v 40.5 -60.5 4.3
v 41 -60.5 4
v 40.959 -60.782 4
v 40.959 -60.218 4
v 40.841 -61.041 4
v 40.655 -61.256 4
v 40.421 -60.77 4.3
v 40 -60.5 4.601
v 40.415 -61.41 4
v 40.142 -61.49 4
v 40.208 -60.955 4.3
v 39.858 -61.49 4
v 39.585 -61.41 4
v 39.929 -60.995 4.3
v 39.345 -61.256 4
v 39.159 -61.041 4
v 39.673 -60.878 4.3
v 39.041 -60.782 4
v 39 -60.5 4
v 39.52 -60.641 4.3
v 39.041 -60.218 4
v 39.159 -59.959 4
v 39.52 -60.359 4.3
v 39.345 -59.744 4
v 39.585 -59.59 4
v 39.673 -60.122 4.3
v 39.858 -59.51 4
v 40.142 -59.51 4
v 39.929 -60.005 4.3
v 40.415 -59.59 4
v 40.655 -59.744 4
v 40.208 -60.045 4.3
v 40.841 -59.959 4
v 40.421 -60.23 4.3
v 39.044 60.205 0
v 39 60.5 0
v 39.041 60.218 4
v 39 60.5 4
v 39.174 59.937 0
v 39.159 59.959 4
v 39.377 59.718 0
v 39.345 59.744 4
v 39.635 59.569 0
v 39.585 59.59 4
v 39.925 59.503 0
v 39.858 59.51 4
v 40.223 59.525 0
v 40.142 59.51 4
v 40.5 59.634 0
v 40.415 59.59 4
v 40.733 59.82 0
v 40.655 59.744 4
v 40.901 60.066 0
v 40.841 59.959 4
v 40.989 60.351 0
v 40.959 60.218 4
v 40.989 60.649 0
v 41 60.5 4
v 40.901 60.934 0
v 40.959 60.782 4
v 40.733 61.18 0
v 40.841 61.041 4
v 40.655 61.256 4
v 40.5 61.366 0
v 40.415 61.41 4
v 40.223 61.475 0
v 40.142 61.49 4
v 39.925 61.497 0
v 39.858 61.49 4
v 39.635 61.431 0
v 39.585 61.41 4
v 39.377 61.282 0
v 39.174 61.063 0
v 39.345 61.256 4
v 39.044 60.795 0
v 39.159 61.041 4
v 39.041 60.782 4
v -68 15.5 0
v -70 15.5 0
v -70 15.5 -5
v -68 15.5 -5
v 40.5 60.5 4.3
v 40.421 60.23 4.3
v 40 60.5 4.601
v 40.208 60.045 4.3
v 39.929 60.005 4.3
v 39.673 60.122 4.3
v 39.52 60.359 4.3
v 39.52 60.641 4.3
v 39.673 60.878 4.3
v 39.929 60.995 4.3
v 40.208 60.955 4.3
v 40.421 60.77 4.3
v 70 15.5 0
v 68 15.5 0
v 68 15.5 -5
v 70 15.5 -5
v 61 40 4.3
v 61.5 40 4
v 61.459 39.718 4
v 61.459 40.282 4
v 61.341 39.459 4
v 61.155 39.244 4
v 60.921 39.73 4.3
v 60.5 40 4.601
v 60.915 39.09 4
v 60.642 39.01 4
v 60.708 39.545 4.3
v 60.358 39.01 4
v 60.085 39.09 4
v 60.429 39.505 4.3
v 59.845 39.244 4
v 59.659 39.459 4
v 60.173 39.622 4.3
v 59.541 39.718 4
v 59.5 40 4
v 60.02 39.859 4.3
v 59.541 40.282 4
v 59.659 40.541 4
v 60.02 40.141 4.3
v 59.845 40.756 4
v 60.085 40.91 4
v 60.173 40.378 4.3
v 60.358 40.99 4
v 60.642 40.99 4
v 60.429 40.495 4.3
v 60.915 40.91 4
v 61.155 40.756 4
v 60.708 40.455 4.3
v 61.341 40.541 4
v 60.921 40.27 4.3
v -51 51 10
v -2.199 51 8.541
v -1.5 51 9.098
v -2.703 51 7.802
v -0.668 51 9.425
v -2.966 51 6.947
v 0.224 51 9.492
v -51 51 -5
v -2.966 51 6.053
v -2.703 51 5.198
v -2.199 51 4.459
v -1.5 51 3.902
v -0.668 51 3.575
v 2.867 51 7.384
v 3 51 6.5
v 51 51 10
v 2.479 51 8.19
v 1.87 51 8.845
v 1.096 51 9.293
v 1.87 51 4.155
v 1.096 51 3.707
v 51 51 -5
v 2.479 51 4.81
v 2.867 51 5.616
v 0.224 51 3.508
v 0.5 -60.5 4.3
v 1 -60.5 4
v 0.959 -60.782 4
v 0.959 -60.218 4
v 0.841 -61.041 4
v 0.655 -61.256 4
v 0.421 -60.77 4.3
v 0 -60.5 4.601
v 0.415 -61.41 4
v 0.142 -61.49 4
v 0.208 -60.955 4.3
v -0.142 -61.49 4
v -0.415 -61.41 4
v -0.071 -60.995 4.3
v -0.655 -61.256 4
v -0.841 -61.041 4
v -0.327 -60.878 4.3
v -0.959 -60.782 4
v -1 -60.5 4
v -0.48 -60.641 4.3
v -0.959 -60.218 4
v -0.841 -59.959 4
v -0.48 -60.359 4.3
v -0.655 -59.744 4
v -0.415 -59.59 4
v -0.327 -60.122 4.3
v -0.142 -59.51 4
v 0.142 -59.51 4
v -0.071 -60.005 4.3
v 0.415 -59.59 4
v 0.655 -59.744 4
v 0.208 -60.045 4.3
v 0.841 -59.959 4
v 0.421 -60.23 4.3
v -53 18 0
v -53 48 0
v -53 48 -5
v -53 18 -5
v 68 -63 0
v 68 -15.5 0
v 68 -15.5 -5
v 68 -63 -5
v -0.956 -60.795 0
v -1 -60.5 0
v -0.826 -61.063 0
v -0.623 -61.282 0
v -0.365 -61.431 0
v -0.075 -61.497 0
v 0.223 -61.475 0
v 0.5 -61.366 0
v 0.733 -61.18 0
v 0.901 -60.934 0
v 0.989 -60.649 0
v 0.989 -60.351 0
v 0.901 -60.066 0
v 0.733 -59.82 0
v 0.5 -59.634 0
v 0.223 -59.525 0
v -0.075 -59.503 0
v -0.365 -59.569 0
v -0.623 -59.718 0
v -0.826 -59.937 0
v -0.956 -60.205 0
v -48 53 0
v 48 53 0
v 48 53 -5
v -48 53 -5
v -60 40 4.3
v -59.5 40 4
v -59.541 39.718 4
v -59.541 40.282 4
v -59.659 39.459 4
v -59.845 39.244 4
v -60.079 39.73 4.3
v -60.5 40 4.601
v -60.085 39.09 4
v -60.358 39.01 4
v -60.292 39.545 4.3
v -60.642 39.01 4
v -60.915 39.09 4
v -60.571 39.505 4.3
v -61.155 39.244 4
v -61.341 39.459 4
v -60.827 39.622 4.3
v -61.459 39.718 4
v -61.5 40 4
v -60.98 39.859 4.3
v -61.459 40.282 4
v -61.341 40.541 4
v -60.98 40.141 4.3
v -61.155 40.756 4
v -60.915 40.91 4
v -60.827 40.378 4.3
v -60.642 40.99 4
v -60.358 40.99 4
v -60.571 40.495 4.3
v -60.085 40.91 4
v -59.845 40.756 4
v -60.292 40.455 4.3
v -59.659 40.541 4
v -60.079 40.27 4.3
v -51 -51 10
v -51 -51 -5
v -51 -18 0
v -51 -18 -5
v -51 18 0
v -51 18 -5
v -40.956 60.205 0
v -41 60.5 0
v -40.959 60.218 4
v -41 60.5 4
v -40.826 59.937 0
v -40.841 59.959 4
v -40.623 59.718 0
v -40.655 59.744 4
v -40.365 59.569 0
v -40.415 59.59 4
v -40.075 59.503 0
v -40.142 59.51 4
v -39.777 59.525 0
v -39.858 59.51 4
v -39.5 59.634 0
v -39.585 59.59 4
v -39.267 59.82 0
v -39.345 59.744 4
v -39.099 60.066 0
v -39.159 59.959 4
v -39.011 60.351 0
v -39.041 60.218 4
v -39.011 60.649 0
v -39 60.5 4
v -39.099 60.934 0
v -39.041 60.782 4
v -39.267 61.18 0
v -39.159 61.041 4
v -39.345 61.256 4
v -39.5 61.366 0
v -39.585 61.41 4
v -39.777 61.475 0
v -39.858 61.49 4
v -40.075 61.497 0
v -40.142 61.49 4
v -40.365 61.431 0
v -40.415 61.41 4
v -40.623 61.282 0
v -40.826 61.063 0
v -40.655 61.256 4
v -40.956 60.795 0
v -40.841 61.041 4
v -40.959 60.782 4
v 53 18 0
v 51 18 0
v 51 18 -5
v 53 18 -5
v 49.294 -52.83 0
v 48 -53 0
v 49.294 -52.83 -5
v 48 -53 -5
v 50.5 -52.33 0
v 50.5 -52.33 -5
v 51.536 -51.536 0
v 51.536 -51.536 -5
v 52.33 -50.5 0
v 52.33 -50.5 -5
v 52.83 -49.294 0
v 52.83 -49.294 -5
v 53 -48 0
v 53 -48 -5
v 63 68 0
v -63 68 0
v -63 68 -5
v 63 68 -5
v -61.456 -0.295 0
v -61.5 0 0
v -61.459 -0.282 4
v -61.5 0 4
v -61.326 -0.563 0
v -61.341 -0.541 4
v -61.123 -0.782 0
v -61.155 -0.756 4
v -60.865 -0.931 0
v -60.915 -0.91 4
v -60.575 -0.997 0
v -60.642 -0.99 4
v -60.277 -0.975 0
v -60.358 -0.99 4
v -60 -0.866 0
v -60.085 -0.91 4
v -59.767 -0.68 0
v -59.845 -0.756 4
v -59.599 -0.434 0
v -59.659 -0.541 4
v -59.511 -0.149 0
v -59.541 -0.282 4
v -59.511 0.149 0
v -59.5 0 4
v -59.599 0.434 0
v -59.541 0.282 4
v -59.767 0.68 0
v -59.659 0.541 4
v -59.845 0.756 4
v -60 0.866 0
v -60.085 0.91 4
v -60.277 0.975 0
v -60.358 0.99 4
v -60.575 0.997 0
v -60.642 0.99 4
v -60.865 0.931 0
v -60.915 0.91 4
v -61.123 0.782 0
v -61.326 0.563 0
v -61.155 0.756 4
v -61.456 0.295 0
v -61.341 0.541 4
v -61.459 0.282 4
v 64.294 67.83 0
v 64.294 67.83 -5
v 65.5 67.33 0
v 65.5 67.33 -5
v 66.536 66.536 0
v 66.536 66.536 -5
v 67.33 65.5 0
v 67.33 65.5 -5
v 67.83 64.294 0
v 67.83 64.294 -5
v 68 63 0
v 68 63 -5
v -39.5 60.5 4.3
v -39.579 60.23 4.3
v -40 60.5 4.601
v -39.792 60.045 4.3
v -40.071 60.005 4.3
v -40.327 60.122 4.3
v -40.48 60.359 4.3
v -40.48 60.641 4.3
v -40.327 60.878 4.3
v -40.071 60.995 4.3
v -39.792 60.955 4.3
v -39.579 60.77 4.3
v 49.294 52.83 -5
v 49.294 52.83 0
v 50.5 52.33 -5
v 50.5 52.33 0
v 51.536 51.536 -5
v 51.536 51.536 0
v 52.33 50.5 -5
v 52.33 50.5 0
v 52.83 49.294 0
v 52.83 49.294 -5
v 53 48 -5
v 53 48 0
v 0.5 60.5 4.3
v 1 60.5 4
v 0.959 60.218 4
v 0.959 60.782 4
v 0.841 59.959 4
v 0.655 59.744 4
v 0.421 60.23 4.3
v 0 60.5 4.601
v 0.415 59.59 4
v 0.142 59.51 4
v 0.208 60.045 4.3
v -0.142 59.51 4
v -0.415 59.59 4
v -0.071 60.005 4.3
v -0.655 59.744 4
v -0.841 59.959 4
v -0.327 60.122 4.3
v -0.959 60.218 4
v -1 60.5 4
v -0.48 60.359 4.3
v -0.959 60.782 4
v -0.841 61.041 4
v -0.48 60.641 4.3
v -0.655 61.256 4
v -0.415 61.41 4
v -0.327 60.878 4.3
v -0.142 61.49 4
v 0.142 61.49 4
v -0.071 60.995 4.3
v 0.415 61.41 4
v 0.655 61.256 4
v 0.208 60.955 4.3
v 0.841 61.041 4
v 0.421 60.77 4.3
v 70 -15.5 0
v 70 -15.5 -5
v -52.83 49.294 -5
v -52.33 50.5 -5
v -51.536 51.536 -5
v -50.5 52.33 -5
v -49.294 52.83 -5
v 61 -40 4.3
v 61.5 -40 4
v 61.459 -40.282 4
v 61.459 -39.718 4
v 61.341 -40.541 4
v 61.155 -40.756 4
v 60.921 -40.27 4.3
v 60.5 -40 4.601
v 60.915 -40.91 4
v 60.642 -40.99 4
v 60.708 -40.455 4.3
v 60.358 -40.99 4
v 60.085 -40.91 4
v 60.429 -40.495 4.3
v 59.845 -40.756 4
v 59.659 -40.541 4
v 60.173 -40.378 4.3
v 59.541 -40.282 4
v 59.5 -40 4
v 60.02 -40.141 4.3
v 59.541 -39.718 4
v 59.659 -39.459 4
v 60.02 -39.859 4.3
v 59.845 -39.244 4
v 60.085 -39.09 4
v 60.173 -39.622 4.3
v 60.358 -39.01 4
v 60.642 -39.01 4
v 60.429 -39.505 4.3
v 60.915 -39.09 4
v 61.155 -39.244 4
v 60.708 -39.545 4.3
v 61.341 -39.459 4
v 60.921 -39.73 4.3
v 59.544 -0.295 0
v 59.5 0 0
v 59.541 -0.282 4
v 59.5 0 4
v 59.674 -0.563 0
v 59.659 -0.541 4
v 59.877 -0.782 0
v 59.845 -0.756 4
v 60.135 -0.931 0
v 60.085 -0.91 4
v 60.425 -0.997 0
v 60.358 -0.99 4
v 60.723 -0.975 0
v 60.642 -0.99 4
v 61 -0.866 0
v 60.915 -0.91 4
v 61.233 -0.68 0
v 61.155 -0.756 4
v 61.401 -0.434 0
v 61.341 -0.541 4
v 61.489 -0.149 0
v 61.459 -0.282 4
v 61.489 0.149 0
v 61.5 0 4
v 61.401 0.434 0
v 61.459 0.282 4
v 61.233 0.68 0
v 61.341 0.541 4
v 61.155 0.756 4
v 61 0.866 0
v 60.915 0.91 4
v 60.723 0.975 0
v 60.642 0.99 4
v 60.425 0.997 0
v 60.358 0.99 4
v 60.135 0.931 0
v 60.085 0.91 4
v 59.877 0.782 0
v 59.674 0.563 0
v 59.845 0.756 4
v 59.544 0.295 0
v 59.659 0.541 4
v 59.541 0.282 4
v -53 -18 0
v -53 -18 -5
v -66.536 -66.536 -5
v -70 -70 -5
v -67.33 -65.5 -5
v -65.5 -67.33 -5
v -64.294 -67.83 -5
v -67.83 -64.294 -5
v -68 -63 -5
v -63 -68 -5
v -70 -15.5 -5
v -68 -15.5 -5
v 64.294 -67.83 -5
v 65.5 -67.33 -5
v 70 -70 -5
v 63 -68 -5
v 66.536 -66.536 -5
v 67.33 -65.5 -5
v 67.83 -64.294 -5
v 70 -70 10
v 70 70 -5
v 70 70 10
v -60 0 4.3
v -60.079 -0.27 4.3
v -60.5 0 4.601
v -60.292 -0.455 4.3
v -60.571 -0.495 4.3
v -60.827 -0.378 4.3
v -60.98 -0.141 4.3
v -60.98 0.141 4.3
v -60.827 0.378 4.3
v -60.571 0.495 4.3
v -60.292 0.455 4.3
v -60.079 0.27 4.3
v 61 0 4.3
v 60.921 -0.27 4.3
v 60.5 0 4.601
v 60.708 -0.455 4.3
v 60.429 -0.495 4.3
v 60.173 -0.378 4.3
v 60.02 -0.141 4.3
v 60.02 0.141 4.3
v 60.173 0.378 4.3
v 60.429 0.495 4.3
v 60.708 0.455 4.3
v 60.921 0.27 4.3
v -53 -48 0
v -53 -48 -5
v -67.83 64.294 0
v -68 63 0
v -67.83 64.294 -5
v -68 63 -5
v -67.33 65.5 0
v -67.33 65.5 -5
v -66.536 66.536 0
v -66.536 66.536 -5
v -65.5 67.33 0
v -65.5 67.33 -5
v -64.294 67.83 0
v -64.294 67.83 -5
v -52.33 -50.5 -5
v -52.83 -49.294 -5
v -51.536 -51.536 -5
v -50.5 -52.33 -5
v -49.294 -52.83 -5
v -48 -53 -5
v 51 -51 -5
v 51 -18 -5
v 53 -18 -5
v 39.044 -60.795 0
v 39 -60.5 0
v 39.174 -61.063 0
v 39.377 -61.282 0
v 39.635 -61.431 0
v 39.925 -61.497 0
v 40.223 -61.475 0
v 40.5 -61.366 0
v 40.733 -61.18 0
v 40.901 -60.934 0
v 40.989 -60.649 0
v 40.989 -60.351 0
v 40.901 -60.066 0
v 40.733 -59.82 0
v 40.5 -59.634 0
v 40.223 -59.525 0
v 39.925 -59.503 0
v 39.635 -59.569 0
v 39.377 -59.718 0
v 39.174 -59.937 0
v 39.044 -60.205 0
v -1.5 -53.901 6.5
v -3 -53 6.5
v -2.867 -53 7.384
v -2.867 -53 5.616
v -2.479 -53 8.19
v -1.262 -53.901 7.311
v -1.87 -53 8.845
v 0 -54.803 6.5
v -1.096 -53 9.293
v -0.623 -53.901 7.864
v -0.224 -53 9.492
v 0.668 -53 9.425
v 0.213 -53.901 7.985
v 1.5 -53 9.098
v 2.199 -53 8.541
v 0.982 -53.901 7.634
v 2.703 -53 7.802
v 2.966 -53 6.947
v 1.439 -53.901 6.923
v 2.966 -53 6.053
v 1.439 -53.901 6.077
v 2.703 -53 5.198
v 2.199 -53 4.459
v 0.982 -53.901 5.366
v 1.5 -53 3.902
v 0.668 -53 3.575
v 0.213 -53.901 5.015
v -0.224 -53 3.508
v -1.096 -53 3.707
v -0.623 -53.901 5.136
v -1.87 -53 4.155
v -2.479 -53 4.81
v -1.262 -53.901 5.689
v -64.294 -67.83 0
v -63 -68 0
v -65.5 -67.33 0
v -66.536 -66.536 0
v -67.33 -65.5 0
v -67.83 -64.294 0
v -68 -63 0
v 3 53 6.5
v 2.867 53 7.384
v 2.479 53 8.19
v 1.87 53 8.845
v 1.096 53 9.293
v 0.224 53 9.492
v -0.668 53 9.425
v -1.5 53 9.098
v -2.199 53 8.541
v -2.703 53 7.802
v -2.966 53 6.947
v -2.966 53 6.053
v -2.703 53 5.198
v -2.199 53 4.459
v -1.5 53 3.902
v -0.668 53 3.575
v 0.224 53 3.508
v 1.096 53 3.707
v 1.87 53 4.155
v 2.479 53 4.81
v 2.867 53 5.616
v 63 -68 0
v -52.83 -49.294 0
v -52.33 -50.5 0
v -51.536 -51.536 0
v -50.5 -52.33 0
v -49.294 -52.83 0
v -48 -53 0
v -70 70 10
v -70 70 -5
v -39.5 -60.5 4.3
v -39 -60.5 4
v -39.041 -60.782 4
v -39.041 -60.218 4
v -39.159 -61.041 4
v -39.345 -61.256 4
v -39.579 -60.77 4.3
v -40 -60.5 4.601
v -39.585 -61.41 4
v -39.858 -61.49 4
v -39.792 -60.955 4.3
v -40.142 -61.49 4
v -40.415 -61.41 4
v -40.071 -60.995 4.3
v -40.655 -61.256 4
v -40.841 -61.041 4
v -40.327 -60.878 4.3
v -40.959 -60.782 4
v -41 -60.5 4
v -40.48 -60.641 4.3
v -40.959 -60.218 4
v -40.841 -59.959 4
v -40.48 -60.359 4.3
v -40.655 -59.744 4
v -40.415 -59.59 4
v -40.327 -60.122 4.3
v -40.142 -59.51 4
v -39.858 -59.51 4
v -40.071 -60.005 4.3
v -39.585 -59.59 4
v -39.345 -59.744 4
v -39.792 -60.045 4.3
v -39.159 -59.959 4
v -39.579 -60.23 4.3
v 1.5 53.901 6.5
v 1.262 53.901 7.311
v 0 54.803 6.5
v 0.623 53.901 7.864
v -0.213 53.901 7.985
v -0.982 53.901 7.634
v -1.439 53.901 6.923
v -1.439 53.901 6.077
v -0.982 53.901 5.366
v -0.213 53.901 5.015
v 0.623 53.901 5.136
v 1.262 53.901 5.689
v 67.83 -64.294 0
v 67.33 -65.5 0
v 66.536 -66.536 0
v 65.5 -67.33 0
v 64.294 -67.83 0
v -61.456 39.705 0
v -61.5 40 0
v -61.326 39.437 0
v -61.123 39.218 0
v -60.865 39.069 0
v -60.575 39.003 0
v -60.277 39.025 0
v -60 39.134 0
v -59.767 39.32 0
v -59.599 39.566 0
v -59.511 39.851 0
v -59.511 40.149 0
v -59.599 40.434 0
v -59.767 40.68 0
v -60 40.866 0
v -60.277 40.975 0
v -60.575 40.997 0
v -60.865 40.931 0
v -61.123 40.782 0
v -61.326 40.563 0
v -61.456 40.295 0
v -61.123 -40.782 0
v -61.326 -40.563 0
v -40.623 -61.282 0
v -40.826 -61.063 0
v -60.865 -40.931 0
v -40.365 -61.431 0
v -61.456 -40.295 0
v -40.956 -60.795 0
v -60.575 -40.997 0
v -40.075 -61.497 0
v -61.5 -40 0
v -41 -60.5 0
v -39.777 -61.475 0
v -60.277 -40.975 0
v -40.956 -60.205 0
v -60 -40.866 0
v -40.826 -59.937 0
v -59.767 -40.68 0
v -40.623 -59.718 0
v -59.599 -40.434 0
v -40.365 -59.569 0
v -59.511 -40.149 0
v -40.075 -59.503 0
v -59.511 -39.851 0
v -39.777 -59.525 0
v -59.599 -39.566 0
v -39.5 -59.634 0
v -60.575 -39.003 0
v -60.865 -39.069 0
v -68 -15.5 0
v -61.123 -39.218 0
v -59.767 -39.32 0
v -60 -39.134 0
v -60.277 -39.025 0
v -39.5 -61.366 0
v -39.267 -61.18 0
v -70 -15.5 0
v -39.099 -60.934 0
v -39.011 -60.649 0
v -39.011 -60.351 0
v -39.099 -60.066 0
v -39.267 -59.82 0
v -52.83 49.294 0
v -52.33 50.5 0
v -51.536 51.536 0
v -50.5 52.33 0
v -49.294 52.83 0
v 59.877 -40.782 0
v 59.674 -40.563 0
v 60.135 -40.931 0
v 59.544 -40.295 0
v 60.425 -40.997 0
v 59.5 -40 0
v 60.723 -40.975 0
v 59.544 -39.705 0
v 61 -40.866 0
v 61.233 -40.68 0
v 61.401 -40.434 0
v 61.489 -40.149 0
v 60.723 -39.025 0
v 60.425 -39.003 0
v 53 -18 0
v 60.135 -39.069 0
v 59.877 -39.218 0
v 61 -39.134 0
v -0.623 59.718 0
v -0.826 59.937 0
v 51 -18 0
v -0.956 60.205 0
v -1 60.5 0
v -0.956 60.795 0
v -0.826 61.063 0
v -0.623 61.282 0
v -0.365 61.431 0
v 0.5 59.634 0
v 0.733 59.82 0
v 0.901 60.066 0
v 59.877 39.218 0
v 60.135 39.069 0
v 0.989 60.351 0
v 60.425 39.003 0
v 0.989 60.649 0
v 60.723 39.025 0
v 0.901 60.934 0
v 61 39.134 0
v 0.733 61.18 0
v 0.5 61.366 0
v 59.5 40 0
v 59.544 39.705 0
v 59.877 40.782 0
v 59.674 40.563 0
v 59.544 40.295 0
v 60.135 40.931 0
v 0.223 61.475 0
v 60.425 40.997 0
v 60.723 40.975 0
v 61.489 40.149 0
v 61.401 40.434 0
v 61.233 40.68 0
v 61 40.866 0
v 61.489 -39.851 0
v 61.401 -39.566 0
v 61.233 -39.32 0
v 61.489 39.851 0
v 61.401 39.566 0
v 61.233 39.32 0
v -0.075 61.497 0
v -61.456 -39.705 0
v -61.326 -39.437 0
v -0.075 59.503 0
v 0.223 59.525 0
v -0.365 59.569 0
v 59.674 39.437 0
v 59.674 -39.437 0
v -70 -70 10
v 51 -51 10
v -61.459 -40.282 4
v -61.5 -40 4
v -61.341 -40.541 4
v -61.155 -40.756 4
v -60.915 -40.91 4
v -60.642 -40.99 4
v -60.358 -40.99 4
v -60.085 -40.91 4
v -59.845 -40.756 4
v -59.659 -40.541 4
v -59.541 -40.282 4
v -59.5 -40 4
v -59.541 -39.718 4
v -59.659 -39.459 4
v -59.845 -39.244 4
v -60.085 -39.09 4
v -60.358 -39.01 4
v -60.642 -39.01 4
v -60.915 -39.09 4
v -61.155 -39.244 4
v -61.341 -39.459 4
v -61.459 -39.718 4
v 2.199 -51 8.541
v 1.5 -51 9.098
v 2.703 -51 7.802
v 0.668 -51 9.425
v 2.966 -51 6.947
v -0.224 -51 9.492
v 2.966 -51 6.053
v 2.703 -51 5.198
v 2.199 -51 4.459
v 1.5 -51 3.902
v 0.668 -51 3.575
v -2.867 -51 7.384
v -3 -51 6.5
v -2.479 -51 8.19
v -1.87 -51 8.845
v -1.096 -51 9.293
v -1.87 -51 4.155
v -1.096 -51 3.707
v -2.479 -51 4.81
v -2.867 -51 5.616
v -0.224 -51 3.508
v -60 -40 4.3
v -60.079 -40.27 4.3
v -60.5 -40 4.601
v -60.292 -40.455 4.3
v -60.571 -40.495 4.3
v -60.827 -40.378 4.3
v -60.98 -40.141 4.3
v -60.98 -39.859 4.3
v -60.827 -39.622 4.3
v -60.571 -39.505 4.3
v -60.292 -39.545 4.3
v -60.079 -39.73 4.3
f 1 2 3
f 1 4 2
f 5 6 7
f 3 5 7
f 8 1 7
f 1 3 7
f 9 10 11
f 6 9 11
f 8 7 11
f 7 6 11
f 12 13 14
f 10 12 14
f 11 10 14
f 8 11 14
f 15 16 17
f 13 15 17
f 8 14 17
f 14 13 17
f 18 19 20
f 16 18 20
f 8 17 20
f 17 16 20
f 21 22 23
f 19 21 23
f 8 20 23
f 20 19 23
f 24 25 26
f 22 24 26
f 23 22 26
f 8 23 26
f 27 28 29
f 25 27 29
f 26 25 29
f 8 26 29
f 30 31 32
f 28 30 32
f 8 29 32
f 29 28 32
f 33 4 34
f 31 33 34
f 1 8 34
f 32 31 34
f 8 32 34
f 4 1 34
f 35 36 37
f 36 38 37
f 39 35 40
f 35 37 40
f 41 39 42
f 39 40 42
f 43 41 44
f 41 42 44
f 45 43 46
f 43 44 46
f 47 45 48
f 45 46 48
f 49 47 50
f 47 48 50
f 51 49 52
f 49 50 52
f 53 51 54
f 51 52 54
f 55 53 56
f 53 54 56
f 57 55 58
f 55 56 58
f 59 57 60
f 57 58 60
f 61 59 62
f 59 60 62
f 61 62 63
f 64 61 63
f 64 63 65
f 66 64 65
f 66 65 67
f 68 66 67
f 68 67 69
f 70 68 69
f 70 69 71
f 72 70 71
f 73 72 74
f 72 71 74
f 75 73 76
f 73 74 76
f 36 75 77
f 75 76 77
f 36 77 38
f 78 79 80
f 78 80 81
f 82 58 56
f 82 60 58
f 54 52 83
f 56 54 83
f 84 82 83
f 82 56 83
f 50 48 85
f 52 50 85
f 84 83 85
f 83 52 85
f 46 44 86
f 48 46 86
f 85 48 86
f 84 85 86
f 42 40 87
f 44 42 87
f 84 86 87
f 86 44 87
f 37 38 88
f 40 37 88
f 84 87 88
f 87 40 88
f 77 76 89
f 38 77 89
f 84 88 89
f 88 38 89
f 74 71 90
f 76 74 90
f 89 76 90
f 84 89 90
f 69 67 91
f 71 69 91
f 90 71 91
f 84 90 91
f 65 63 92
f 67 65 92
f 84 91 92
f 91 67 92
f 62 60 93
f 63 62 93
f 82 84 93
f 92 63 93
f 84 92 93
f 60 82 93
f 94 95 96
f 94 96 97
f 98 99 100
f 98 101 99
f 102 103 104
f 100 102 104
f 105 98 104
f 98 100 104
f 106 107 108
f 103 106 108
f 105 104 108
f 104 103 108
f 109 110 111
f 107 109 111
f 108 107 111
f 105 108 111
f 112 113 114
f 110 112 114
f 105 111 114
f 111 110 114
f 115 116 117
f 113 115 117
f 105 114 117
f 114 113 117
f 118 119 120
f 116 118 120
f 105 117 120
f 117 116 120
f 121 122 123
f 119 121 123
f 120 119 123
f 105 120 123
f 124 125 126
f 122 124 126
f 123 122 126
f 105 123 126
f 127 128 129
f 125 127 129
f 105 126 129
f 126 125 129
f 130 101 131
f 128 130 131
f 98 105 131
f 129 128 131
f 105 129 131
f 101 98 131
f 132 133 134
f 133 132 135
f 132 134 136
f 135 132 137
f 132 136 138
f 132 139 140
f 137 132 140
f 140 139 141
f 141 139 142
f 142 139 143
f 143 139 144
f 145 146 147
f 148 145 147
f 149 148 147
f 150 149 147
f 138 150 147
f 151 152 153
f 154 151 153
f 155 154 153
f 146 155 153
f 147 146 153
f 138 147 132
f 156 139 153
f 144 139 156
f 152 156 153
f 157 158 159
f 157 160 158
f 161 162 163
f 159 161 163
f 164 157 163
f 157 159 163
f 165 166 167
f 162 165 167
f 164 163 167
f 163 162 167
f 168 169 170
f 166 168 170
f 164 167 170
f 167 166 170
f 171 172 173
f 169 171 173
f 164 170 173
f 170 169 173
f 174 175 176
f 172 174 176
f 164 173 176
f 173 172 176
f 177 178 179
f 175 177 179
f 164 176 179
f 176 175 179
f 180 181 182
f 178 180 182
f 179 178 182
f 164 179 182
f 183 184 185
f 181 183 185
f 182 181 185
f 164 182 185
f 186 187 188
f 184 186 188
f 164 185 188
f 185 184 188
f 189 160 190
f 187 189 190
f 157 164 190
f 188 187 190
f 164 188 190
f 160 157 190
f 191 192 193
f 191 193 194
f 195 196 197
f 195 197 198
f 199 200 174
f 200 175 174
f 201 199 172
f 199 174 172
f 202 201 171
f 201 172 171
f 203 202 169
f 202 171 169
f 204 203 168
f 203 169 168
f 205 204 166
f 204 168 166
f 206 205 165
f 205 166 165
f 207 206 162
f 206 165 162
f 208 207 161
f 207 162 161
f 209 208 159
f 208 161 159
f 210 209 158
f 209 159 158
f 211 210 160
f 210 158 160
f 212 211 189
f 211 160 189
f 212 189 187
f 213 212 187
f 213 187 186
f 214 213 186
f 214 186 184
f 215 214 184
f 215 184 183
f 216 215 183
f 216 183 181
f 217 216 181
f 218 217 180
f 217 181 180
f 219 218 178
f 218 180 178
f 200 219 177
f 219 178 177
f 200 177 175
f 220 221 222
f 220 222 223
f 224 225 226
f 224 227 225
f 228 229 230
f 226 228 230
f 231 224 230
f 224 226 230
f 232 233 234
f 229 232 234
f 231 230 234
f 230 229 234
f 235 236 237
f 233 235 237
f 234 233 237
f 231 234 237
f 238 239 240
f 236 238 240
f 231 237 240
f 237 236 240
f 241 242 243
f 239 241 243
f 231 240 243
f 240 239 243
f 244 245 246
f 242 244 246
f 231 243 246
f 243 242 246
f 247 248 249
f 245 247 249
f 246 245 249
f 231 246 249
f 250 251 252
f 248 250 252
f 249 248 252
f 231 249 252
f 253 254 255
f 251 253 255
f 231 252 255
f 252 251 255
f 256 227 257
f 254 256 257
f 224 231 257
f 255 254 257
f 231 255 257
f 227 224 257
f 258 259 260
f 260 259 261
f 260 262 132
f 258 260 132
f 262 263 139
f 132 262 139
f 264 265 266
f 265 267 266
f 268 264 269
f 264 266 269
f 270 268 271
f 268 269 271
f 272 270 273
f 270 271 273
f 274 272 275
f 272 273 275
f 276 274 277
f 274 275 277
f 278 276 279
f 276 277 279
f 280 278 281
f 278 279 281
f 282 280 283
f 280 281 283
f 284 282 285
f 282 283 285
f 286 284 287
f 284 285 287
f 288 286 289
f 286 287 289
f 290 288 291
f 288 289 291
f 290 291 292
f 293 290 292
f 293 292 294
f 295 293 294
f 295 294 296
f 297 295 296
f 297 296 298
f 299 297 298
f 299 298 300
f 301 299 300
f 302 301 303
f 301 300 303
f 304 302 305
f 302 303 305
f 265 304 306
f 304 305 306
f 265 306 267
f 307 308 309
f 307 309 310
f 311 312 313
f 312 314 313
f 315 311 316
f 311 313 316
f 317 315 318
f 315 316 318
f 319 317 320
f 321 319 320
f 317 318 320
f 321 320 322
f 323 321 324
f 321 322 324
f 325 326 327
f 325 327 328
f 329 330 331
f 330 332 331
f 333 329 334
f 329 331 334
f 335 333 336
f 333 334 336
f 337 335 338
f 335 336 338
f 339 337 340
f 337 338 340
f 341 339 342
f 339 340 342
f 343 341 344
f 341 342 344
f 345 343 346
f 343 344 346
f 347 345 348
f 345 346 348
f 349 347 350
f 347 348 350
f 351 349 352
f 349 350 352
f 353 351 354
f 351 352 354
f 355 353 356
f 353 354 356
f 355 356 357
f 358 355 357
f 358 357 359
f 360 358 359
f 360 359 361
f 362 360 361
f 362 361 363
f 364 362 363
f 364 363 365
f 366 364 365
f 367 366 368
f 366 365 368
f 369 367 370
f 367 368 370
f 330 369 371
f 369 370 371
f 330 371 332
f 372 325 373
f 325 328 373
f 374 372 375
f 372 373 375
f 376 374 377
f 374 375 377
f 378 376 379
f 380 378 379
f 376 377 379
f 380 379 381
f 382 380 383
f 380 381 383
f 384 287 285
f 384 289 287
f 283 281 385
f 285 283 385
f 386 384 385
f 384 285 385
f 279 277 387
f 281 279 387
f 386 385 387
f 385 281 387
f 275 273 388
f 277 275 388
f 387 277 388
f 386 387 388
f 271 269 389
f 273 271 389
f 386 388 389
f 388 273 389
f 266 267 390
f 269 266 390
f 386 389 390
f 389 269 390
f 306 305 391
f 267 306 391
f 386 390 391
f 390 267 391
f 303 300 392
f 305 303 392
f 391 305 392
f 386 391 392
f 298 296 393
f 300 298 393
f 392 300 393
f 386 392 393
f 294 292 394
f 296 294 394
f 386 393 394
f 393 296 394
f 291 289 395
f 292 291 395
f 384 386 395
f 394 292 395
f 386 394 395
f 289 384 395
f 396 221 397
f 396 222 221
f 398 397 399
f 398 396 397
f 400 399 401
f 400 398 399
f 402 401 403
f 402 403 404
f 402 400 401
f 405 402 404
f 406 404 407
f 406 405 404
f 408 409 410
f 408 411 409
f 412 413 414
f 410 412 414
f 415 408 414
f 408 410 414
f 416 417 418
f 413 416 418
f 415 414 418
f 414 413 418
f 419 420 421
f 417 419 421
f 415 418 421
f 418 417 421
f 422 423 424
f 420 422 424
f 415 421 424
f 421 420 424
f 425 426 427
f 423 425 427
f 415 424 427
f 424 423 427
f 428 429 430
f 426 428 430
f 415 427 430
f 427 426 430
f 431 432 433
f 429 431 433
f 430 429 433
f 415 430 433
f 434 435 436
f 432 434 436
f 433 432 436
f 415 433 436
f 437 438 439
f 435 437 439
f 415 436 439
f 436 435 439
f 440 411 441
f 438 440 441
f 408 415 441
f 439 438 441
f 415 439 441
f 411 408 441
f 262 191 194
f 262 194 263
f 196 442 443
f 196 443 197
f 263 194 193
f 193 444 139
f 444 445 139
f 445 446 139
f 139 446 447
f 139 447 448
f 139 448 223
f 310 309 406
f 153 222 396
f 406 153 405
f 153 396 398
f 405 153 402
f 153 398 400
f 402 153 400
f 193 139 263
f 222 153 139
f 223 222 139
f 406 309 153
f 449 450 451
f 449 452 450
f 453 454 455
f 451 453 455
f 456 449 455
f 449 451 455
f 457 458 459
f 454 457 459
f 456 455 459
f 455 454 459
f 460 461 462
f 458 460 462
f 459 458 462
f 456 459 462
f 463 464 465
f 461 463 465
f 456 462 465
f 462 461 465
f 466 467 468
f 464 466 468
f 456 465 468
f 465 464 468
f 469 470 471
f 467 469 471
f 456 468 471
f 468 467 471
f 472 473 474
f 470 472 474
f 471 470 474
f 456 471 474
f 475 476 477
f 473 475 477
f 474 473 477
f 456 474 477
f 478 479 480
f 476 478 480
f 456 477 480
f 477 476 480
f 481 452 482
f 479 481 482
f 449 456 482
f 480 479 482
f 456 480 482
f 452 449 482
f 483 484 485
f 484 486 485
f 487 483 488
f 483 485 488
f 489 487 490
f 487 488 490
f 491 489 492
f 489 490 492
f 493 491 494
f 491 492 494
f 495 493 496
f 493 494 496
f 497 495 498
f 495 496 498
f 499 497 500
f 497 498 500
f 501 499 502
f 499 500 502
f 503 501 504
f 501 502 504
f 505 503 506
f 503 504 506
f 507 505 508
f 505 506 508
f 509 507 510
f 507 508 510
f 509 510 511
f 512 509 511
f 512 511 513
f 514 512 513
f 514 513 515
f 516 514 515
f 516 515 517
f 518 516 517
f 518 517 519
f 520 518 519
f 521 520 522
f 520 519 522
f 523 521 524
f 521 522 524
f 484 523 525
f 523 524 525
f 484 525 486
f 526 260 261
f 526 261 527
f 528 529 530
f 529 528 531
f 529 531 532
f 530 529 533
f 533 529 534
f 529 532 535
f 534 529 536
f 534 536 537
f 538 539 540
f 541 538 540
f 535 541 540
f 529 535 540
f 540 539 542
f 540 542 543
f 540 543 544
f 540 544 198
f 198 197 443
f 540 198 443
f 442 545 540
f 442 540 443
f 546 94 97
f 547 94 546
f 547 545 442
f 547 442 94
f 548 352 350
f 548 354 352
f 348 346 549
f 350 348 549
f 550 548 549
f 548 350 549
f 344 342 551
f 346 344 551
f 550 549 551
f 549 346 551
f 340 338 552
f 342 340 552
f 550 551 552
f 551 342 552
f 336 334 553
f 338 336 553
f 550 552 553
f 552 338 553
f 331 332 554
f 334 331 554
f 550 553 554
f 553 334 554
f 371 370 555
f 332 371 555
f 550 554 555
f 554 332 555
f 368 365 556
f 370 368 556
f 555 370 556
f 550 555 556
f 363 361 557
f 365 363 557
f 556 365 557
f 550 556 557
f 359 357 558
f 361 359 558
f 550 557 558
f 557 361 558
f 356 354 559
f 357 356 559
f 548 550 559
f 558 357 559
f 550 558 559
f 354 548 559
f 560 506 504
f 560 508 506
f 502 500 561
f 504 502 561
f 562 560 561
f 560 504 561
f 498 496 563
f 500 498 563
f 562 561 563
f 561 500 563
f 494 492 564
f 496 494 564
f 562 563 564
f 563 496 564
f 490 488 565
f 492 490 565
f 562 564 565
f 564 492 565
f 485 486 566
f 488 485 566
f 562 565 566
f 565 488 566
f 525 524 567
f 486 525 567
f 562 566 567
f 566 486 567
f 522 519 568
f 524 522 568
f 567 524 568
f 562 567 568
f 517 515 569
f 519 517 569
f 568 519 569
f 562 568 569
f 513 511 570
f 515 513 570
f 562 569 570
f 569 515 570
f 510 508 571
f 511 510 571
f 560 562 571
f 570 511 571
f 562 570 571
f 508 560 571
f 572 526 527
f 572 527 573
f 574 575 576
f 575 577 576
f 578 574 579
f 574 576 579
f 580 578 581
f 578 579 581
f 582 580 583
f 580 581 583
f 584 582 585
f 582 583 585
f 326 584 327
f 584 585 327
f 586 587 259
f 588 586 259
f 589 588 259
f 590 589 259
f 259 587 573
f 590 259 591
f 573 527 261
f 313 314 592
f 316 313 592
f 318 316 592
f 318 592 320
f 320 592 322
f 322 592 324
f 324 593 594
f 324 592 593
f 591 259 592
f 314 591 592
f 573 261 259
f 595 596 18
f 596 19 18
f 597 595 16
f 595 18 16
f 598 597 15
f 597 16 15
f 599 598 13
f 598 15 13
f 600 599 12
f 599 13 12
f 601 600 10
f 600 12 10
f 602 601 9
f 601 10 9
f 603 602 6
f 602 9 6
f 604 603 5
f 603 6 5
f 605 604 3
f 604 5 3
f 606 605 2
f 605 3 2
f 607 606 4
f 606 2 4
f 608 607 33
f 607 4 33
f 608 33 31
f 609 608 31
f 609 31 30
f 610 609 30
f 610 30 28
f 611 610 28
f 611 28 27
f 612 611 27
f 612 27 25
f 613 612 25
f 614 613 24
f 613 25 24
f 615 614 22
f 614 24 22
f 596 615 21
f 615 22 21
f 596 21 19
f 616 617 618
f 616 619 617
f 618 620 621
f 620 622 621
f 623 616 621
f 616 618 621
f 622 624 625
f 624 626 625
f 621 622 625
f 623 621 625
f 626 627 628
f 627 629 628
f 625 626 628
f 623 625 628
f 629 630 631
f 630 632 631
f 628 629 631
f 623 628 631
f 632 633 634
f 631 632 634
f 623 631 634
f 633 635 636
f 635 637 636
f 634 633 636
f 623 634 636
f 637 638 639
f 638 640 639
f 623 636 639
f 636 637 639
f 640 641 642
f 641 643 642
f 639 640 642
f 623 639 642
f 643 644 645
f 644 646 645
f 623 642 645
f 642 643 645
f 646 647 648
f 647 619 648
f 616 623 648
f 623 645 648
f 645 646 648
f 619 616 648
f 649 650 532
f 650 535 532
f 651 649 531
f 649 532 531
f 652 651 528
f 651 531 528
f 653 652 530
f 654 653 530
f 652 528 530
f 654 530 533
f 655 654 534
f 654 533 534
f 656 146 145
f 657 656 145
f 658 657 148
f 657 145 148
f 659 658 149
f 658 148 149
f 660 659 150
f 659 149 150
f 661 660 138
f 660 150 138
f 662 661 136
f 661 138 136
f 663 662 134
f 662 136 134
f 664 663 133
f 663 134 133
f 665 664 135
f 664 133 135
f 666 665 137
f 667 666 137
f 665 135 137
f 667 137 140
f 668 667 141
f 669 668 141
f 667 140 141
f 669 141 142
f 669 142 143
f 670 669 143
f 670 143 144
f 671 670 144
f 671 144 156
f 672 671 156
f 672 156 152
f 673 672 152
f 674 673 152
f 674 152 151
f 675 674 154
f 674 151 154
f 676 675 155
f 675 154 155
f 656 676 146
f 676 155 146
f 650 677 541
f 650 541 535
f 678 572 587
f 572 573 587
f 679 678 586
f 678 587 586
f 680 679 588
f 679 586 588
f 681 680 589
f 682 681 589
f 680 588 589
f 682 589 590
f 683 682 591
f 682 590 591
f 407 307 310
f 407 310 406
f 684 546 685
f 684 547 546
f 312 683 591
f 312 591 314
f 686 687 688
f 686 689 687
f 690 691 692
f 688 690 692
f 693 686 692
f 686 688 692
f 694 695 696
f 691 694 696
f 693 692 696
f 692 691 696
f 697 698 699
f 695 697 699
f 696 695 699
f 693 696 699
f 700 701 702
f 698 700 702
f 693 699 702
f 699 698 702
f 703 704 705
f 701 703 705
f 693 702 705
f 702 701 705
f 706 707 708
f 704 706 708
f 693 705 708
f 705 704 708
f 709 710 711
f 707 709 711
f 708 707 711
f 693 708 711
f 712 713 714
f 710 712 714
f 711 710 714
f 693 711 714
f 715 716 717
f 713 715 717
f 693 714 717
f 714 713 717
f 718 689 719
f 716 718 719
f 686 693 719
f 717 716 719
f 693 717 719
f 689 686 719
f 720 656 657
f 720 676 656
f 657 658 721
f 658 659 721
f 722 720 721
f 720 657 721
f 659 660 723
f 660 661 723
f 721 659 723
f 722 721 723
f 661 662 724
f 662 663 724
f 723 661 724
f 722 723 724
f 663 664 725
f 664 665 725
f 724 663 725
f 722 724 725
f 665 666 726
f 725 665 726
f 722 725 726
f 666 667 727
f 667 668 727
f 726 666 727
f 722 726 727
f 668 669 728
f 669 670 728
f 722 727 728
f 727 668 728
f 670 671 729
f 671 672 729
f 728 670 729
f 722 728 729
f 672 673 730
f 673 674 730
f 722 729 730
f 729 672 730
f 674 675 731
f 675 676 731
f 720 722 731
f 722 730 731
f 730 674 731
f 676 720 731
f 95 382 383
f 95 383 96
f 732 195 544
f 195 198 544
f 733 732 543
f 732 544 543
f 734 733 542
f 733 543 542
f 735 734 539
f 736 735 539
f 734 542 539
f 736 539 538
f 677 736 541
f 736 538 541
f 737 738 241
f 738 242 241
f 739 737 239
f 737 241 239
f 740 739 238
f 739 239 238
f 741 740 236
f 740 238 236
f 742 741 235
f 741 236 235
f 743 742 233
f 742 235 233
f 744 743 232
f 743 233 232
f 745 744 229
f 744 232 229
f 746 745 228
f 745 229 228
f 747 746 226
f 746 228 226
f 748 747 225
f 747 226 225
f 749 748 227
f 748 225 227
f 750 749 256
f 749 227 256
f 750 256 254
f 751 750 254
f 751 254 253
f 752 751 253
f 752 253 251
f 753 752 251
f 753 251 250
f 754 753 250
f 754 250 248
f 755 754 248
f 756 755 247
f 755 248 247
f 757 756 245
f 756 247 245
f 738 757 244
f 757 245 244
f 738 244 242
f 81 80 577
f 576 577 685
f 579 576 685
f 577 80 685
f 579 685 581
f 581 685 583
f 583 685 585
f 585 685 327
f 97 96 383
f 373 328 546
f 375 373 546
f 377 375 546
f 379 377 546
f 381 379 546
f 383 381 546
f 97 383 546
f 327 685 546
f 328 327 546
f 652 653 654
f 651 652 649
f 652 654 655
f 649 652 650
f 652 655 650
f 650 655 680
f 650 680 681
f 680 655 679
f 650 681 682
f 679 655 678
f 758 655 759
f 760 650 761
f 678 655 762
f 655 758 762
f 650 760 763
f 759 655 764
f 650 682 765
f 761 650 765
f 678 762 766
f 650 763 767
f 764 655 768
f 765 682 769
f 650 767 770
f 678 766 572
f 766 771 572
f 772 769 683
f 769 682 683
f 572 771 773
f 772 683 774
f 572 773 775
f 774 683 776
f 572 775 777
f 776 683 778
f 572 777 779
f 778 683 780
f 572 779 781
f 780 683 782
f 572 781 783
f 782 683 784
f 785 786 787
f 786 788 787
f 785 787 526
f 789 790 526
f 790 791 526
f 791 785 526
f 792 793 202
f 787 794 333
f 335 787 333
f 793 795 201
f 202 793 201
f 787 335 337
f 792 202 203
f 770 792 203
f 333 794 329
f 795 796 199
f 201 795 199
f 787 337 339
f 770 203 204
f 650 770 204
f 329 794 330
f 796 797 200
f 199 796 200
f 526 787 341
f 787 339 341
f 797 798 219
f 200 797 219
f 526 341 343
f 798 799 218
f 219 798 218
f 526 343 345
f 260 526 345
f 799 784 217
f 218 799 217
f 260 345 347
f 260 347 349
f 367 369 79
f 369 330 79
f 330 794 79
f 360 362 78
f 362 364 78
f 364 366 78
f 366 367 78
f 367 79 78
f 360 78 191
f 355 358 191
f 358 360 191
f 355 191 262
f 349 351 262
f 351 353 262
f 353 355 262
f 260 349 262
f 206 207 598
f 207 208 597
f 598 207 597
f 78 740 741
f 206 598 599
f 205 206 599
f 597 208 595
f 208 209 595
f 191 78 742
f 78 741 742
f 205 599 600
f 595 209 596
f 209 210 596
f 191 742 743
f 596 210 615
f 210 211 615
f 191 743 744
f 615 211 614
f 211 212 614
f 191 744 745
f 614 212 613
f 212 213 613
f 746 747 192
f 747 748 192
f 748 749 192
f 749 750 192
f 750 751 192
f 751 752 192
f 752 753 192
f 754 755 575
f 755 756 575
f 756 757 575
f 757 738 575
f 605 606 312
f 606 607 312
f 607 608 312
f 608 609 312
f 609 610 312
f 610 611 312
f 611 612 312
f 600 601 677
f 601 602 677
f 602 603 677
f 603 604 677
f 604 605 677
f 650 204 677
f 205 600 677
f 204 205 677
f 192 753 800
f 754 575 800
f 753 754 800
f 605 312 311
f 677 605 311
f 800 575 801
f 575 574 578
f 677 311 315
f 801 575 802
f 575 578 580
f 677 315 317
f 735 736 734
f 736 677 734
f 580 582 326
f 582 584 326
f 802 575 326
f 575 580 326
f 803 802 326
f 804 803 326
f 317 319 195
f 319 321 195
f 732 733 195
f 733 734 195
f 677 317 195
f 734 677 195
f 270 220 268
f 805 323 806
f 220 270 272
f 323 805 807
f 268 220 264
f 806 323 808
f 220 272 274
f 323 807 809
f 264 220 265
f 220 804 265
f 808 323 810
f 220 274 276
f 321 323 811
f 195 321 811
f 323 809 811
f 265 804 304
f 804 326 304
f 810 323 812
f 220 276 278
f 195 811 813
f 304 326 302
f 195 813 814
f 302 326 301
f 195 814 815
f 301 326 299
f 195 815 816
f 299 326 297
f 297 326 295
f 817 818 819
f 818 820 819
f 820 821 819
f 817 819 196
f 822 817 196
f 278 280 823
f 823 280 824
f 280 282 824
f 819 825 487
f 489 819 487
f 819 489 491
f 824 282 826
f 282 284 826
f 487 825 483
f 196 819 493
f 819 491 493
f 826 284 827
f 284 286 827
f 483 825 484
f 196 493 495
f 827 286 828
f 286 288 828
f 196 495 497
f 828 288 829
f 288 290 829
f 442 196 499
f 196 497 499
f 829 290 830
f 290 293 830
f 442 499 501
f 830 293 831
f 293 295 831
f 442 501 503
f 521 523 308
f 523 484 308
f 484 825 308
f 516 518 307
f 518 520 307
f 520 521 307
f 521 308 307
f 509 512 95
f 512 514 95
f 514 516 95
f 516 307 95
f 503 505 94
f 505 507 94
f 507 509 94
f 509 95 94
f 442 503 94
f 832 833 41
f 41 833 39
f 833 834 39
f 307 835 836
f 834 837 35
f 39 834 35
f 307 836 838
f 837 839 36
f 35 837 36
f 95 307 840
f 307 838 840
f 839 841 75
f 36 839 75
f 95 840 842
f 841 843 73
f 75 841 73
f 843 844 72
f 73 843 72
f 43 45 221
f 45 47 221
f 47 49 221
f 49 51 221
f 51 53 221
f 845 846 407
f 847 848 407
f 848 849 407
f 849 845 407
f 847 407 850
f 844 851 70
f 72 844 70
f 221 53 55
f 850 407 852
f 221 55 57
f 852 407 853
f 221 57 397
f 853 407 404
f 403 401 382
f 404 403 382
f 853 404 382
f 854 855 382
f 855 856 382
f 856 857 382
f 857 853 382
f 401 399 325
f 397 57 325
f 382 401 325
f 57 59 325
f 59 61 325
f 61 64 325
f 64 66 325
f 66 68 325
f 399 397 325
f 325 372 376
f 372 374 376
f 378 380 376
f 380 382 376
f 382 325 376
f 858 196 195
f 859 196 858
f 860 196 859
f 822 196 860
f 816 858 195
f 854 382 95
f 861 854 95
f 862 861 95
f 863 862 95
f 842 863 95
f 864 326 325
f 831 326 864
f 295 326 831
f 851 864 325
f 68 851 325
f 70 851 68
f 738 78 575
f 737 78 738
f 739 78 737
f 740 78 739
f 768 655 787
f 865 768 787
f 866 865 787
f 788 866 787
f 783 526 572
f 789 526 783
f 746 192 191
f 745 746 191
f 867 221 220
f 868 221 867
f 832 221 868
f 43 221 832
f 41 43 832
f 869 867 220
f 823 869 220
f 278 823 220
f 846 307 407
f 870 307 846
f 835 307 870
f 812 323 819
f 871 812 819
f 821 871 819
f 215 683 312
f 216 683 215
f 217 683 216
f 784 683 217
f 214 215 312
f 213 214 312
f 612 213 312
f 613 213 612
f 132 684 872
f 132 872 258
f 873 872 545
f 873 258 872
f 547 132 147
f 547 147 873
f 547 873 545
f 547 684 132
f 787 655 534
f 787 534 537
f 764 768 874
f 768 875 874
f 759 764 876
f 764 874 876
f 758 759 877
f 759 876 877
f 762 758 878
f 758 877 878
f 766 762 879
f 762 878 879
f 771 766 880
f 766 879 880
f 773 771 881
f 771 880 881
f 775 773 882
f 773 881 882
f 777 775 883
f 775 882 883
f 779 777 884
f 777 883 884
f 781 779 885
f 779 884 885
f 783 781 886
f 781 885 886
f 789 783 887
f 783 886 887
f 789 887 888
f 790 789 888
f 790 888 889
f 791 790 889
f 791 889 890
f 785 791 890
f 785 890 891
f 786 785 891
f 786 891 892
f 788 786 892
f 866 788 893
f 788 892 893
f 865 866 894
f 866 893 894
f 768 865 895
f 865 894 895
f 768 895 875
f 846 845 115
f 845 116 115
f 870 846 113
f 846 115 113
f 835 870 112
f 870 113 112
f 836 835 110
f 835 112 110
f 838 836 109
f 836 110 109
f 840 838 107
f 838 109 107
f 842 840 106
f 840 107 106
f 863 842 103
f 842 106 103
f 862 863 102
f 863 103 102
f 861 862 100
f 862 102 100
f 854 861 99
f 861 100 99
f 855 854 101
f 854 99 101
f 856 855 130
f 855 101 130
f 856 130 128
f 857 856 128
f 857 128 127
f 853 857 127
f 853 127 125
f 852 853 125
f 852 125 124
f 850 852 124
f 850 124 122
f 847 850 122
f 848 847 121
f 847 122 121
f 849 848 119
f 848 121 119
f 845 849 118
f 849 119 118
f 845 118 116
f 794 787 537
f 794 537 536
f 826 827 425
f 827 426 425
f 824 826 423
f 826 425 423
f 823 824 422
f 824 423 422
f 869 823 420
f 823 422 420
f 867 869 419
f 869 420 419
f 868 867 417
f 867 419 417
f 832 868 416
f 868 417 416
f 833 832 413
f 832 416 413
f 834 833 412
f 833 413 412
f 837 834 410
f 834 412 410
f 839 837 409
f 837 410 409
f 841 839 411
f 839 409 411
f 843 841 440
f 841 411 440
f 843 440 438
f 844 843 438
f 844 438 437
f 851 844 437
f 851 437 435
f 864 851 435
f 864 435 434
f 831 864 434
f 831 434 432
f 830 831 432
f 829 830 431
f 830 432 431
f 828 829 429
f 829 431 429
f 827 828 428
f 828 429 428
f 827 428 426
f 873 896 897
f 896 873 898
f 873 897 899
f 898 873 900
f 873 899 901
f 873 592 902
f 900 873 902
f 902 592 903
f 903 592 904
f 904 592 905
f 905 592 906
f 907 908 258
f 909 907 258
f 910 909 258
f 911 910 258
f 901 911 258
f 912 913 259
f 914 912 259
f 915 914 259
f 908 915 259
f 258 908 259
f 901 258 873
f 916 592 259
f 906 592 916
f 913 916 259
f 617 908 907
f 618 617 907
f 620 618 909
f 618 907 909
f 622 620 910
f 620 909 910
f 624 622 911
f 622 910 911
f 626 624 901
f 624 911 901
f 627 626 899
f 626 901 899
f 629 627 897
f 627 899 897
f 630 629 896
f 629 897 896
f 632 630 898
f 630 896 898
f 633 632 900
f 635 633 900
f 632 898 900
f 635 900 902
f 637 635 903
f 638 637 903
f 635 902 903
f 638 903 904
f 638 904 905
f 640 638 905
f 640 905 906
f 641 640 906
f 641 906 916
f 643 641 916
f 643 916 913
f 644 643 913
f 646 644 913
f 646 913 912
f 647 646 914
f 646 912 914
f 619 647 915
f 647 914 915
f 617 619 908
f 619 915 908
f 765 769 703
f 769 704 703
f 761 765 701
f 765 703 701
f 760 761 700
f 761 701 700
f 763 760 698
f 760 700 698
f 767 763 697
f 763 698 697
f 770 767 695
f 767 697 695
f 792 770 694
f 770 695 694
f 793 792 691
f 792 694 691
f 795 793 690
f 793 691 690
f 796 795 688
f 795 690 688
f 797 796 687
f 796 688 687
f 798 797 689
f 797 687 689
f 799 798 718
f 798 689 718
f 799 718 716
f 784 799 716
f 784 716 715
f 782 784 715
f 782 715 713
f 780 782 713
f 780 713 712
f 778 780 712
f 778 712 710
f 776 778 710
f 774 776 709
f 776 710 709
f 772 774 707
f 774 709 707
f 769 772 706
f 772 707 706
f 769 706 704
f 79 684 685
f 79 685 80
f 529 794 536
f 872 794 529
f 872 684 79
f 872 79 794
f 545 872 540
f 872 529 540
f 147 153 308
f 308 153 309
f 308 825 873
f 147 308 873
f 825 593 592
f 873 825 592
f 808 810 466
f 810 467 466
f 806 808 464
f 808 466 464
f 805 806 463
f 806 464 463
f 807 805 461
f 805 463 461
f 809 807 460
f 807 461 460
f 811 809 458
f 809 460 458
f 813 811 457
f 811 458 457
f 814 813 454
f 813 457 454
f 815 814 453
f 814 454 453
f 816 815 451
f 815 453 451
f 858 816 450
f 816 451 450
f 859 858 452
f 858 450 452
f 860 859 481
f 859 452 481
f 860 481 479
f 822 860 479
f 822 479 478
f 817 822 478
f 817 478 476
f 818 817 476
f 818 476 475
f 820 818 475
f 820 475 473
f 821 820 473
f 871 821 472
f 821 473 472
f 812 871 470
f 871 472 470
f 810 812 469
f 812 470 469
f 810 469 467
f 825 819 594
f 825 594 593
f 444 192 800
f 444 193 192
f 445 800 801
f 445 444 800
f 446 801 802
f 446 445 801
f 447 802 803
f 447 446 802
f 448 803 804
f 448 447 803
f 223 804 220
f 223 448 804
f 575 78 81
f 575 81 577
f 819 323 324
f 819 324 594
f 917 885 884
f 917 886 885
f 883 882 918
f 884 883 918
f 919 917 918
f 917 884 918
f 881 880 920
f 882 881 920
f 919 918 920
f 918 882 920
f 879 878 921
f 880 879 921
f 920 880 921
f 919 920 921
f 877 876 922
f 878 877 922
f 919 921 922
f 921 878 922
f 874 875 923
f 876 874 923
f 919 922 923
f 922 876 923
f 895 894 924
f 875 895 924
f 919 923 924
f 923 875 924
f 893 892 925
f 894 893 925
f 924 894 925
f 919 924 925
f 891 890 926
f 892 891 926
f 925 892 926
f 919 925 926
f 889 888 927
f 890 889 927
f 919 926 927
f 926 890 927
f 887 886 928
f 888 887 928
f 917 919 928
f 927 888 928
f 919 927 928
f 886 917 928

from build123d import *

# Parameters (mm, degrees)
F1_DEPTH = 10
F2_DEPTH = 5
F3_D     = 2
F3_DEPTH = 4
F3_TIP   = 0.600860619
F4_R     = 5
F6_D     = 6
F6_DEPTH = 2
F6_TIP   = 1.8025818571
F8_D     = 6
F8_DEPTH = 2
F8_TIP   = 1.8025818571


# Not quite as in the source:
# - a feature names something its author has since deleted; it is built from what else it names


with BuildPart() as f1:
    # F0 (on Top) → F1 (new body)
    with BuildSketch(Plane.XY):
        Polygon((70, 70), (-70, 70), (-70, 15.5), (-68, 15.5), (-68, 68), (68, 68), (68, 15.5), (70, 15.5), align=None)
        Polygon((-68, 68), (-68, 15.5), (-68, 0), (-68, -15.5), (-68, -68), (68, -68), (68, -15.5), (68, 0), (68, 15.5), (68, 68), align=None)
        Polygon((53, -18), (53, -53), (-53, -53), (-53, -18), (-53, 18), (-53, 53), (53, 53), (53, 18), (53, 0), align=None, mode=Mode.SUBTRACT)
        Polygon((-68, 15.5), (-70, 15.5), (-70, -15.5), (-68, -15.5), (-68, 0), align=None)
        Polygon((-68, -15.5), (-70, -15.5), (-70, -70), (70, -70), (70, -15.5), (68, -15.5), (68, -68), (-68, -68), align=None)
        Polygon((70, -15.5), (70, 15.5), (68, 15.5), (68, 0), (68, -15.5), align=None)
        Polygon((-53, 53), (-53, 18), (-51, 18), (-51, 51), (51, 51), (51, 18), (53, 18), (53, 53), align=None)
        Polygon((-53, 18), (-53, -18), (-51, -18), (-51, 0), (-51, 18), align=None)
        Polygon((51, -18), (53, -18), (53, 0), (53, 18), (51, 18), align=None)
        Polygon((-53, -53), (53, -53), (53, -18), (51, -18), (51, -51), (-51, -51), (-51, -18), (-53, -18), align=None)
    extrude(amount=F1_DEPTH)

    # F0 (on Top) → F2 (join)
    with BuildSketch(Plane.XY):
        Polygon((70, 70), (-70, 70), (-70, 15.5), (-68, 15.5), (-68, 68), (68, 68), (68, 15.5), (70, 15.5), align=None)
        Polygon((-68, -15.5), (-70, -15.5), (-70, -70), (70, -70), (70, -15.5), (68, -15.5), (68, -68), (-68, -68), align=None)
        Polygon((-53, -53), (53, -53), (53, -18), (51, -18), (51, -51), (-51, -51), (-51, -18), (-53, -18), align=None)
        Polygon((-53, 53), (-53, 18), (-51, 18), (-51, 51), (51, 51), (51, 18), (53, 18), (53, 53), align=None)
    extrude(amount=-F2_DEPTH)

    # F3
    with Locations(Plane(origin=(0, 0, 0), x_dir=(1, 0, 0), z_dir=(0, 0, -1))):
        with Locations((0, 60.5), (60.5, 0), (0, -60.5), (-60.5, 0), (-60.5, 40), (-40, 60.5), (40, 60.5), (60.5, 40), (60.5, -40), (40, -60.5), (-40, -60.5), (-60.5, -40)):
            Hole(F3_D / 2, depth=F3_DEPTH)
            with Locations((0, 0, -(F3_DEPTH + F3_TIP / 2))):  # 118° drill point
                Cone(0, F3_D / 2, F3_TIP, mode=Mode.SUBTRACT)

    # F4
    f4_edges = [f1.edges().sort_by_distance(p)[0] for p in [
        (-68, -68, -2.5),
        (-53, -53, -2.5),
        (-53, 53, -2.5),
        (53, 53, -2.5),
        (53, -53, -2.5),
        (68, 68, -2.5),
        (-68, 68, -2.5),
        (68, -68, -2.5),
    ]]
    fillet(f4_edges, radius=F4_R)

    # F6 (one way)
    with BuildSketch(Plane.XZ.offset(-51)):
        with Locations((0, 6.5)):
            Circle(F6_D / 2)
    extrude(amount=-F6_DEPTH, mode=Mode.SUBTRACT)
    with Locations(Plane.XZ.offset(-51)):
        with Locations((0, 6.5)):
            with Locations((0, 0, -(F6_DEPTH + F6_TIP / 2))):  # 118° drill point
                Cone(0, F6_D / 2, F6_TIP, mode=Mode.SUBTRACT)

    # F8 (one way)
    with BuildSketch(Plane(origin=(0, -51, 0), x_dir=(-1, 0, 0), z_dir=(0, 1, 0))):
        with Locations((0, 6.5)):
            Circle(F8_D / 2)
    extrude(amount=-F8_DEPTH, mode=Mode.SUBTRACT)
    with Locations(Plane(origin=(0, -51, 0), x_dir=(-1, 0, 0), z_dir=(0, 1, 0))):
        with Locations((0, 6.5)):
            with Locations((0, 0, -(F8_DEPTH + F8_TIP / 2))):  # 118° drill point
                Cone(0, F8_D / 2, F8_TIP, mode=Mode.SUBTRACT)


solid = f1.part
